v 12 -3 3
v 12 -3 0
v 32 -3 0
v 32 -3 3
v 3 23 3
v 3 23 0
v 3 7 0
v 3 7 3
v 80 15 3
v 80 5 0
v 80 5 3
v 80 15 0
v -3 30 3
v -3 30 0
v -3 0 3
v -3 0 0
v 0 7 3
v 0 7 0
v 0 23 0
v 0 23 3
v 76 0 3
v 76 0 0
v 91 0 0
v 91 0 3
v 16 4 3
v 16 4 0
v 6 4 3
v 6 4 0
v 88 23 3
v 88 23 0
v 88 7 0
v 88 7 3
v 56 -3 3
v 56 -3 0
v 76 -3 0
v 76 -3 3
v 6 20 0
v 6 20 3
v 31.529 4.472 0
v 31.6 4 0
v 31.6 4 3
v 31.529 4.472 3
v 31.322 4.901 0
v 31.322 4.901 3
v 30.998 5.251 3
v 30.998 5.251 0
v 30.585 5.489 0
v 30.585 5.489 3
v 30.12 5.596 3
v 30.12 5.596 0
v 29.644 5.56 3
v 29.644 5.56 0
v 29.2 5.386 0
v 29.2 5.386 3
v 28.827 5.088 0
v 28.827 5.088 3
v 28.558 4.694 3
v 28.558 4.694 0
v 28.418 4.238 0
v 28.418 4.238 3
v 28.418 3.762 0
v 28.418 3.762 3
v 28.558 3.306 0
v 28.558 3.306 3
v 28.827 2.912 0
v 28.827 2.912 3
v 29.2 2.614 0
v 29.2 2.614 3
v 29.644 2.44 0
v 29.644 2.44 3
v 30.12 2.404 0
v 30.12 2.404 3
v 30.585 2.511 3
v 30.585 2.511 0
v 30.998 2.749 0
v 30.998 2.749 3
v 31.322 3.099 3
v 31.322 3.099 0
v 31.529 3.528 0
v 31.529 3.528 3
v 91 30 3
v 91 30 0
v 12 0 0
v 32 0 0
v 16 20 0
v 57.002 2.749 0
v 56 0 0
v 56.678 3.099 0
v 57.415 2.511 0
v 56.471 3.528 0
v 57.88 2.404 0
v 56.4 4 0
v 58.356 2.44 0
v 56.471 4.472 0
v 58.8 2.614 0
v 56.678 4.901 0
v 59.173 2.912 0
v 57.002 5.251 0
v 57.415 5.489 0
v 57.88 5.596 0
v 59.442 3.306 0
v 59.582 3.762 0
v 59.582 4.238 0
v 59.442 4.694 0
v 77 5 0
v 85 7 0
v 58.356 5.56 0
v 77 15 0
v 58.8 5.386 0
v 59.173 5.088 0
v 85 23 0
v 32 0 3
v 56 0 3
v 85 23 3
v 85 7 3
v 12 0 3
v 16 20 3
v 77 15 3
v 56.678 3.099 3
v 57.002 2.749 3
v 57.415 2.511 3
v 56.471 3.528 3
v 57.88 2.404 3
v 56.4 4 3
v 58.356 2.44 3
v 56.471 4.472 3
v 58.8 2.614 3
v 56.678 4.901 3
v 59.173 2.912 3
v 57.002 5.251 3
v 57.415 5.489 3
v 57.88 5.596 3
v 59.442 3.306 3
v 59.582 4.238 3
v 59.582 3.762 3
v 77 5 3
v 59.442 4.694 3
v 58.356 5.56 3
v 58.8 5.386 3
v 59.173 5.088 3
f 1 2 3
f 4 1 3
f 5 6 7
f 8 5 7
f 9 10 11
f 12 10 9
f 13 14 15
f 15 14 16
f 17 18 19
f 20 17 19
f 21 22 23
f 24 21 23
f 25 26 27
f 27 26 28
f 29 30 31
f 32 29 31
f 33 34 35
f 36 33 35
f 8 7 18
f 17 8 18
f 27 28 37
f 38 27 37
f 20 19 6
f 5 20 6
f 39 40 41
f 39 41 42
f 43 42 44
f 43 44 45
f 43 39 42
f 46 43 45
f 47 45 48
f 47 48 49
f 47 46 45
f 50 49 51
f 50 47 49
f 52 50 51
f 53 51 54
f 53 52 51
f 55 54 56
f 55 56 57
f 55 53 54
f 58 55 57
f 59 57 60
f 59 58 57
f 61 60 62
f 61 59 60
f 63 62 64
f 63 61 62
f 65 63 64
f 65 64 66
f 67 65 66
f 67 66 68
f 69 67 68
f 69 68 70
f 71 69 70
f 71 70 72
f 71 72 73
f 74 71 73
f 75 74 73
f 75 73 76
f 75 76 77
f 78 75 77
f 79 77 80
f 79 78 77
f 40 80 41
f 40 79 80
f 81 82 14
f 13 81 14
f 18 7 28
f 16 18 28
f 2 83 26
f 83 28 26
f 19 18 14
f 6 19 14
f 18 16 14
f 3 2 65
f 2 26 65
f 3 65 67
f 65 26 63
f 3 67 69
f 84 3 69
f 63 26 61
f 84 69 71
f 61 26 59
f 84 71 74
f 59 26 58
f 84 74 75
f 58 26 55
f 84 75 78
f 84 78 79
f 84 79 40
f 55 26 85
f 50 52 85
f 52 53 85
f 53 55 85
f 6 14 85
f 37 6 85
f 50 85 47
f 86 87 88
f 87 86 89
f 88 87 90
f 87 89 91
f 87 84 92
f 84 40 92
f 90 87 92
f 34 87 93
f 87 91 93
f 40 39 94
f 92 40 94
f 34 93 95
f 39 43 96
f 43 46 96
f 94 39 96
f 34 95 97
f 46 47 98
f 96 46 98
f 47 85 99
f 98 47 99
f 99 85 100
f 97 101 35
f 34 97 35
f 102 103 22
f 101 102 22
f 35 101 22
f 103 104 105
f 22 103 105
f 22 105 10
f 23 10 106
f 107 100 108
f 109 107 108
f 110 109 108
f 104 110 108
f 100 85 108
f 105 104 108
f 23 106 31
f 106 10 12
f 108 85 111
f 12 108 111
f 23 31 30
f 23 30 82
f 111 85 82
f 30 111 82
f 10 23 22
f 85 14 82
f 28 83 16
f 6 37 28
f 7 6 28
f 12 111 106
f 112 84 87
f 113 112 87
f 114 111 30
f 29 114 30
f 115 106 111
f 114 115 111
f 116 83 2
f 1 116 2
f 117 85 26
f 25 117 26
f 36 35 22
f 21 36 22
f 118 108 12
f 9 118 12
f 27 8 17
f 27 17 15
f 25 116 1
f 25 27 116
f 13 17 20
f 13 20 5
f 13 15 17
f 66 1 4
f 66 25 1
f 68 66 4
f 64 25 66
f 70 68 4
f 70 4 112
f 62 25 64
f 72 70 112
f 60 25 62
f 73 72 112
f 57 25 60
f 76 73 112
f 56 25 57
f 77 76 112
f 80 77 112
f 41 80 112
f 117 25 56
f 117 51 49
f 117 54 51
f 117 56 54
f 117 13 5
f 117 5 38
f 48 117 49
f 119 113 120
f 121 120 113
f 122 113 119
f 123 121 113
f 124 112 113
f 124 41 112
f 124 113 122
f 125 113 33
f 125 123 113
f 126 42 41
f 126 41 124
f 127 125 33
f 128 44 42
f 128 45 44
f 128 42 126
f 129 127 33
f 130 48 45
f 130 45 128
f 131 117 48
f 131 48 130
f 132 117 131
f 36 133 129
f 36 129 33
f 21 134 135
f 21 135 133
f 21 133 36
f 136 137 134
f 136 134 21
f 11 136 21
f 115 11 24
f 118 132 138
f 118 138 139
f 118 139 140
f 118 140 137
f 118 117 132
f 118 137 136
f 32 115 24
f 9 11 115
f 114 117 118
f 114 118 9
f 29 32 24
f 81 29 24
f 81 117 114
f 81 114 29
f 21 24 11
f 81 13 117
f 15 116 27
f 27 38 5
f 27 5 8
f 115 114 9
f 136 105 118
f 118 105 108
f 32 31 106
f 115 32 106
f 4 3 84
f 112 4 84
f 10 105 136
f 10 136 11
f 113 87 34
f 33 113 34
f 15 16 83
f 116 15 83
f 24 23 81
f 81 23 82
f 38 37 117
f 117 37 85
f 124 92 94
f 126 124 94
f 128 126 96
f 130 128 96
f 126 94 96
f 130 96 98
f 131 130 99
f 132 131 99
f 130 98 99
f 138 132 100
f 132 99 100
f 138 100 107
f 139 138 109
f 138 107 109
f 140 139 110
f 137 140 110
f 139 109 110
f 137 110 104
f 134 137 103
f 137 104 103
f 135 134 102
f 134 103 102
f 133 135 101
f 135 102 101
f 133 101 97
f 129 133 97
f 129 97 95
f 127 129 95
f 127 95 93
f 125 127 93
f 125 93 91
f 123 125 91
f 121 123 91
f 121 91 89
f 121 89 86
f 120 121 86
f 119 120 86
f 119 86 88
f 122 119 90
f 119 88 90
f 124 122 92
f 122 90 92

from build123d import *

# Parameters (mm, degrees)
SKETCH_1_R      = 1.6
SKETCH_1_W      = 3
SKETCH_1_H      = 10
EXTRUDE_1_DEPTH = 3


with BuildPart() as part:
    # 草图1 → 凸台-拉伸1 (new body)
    with BuildSketch(Plane.XY):
        Polygon((32, 0), (44, 0), (56, 0), (56, -3), (76, -3), (76, 0), (88, 0), (91, 0), (91, 30), (88, 30), (0, 30), (-3, 30), (-3, 0), (0, 0), (12, 0), (12, -3), (32, -3), align=None)
        with Locations((30, 4)):
            Circle(SKETCH_1_R, mode=Mode.SUBTRACT)
        Polygon((6, 4), (6, 7), (6, 20), (11, 20), (16, 20), (16, 4), (11, 4), align=None, mode=Mode.SUBTRACT)
        with BuildLine():
            ThreePointArc((59.6, 4), (58, 2.4), (56.4, 4))
            ThreePointArc((56.4, 4), (58, 5.6), (59.6, 4))
        make_face(mode=Mode.SUBTRACT)
        with Locations((78.5, 10)):
            Rectangle(SKETCH_1_W, SKETCH_1_H, mode=Mode.SUBTRACT)
        Polygon((0, 15), (0, 23), (3, 23), (3, 15), (3, 7), (0, 7), align=None, mode=Mode.SUBTRACT)
        Polygon((85, 23), (88, 23), (88, 15), (88, 7), (85, 7), (85, 15), align=None, mode=Mode.SUBTRACT)
    extrude(amount=EXTRUDE_1_DEPTH)


solid = part.part
